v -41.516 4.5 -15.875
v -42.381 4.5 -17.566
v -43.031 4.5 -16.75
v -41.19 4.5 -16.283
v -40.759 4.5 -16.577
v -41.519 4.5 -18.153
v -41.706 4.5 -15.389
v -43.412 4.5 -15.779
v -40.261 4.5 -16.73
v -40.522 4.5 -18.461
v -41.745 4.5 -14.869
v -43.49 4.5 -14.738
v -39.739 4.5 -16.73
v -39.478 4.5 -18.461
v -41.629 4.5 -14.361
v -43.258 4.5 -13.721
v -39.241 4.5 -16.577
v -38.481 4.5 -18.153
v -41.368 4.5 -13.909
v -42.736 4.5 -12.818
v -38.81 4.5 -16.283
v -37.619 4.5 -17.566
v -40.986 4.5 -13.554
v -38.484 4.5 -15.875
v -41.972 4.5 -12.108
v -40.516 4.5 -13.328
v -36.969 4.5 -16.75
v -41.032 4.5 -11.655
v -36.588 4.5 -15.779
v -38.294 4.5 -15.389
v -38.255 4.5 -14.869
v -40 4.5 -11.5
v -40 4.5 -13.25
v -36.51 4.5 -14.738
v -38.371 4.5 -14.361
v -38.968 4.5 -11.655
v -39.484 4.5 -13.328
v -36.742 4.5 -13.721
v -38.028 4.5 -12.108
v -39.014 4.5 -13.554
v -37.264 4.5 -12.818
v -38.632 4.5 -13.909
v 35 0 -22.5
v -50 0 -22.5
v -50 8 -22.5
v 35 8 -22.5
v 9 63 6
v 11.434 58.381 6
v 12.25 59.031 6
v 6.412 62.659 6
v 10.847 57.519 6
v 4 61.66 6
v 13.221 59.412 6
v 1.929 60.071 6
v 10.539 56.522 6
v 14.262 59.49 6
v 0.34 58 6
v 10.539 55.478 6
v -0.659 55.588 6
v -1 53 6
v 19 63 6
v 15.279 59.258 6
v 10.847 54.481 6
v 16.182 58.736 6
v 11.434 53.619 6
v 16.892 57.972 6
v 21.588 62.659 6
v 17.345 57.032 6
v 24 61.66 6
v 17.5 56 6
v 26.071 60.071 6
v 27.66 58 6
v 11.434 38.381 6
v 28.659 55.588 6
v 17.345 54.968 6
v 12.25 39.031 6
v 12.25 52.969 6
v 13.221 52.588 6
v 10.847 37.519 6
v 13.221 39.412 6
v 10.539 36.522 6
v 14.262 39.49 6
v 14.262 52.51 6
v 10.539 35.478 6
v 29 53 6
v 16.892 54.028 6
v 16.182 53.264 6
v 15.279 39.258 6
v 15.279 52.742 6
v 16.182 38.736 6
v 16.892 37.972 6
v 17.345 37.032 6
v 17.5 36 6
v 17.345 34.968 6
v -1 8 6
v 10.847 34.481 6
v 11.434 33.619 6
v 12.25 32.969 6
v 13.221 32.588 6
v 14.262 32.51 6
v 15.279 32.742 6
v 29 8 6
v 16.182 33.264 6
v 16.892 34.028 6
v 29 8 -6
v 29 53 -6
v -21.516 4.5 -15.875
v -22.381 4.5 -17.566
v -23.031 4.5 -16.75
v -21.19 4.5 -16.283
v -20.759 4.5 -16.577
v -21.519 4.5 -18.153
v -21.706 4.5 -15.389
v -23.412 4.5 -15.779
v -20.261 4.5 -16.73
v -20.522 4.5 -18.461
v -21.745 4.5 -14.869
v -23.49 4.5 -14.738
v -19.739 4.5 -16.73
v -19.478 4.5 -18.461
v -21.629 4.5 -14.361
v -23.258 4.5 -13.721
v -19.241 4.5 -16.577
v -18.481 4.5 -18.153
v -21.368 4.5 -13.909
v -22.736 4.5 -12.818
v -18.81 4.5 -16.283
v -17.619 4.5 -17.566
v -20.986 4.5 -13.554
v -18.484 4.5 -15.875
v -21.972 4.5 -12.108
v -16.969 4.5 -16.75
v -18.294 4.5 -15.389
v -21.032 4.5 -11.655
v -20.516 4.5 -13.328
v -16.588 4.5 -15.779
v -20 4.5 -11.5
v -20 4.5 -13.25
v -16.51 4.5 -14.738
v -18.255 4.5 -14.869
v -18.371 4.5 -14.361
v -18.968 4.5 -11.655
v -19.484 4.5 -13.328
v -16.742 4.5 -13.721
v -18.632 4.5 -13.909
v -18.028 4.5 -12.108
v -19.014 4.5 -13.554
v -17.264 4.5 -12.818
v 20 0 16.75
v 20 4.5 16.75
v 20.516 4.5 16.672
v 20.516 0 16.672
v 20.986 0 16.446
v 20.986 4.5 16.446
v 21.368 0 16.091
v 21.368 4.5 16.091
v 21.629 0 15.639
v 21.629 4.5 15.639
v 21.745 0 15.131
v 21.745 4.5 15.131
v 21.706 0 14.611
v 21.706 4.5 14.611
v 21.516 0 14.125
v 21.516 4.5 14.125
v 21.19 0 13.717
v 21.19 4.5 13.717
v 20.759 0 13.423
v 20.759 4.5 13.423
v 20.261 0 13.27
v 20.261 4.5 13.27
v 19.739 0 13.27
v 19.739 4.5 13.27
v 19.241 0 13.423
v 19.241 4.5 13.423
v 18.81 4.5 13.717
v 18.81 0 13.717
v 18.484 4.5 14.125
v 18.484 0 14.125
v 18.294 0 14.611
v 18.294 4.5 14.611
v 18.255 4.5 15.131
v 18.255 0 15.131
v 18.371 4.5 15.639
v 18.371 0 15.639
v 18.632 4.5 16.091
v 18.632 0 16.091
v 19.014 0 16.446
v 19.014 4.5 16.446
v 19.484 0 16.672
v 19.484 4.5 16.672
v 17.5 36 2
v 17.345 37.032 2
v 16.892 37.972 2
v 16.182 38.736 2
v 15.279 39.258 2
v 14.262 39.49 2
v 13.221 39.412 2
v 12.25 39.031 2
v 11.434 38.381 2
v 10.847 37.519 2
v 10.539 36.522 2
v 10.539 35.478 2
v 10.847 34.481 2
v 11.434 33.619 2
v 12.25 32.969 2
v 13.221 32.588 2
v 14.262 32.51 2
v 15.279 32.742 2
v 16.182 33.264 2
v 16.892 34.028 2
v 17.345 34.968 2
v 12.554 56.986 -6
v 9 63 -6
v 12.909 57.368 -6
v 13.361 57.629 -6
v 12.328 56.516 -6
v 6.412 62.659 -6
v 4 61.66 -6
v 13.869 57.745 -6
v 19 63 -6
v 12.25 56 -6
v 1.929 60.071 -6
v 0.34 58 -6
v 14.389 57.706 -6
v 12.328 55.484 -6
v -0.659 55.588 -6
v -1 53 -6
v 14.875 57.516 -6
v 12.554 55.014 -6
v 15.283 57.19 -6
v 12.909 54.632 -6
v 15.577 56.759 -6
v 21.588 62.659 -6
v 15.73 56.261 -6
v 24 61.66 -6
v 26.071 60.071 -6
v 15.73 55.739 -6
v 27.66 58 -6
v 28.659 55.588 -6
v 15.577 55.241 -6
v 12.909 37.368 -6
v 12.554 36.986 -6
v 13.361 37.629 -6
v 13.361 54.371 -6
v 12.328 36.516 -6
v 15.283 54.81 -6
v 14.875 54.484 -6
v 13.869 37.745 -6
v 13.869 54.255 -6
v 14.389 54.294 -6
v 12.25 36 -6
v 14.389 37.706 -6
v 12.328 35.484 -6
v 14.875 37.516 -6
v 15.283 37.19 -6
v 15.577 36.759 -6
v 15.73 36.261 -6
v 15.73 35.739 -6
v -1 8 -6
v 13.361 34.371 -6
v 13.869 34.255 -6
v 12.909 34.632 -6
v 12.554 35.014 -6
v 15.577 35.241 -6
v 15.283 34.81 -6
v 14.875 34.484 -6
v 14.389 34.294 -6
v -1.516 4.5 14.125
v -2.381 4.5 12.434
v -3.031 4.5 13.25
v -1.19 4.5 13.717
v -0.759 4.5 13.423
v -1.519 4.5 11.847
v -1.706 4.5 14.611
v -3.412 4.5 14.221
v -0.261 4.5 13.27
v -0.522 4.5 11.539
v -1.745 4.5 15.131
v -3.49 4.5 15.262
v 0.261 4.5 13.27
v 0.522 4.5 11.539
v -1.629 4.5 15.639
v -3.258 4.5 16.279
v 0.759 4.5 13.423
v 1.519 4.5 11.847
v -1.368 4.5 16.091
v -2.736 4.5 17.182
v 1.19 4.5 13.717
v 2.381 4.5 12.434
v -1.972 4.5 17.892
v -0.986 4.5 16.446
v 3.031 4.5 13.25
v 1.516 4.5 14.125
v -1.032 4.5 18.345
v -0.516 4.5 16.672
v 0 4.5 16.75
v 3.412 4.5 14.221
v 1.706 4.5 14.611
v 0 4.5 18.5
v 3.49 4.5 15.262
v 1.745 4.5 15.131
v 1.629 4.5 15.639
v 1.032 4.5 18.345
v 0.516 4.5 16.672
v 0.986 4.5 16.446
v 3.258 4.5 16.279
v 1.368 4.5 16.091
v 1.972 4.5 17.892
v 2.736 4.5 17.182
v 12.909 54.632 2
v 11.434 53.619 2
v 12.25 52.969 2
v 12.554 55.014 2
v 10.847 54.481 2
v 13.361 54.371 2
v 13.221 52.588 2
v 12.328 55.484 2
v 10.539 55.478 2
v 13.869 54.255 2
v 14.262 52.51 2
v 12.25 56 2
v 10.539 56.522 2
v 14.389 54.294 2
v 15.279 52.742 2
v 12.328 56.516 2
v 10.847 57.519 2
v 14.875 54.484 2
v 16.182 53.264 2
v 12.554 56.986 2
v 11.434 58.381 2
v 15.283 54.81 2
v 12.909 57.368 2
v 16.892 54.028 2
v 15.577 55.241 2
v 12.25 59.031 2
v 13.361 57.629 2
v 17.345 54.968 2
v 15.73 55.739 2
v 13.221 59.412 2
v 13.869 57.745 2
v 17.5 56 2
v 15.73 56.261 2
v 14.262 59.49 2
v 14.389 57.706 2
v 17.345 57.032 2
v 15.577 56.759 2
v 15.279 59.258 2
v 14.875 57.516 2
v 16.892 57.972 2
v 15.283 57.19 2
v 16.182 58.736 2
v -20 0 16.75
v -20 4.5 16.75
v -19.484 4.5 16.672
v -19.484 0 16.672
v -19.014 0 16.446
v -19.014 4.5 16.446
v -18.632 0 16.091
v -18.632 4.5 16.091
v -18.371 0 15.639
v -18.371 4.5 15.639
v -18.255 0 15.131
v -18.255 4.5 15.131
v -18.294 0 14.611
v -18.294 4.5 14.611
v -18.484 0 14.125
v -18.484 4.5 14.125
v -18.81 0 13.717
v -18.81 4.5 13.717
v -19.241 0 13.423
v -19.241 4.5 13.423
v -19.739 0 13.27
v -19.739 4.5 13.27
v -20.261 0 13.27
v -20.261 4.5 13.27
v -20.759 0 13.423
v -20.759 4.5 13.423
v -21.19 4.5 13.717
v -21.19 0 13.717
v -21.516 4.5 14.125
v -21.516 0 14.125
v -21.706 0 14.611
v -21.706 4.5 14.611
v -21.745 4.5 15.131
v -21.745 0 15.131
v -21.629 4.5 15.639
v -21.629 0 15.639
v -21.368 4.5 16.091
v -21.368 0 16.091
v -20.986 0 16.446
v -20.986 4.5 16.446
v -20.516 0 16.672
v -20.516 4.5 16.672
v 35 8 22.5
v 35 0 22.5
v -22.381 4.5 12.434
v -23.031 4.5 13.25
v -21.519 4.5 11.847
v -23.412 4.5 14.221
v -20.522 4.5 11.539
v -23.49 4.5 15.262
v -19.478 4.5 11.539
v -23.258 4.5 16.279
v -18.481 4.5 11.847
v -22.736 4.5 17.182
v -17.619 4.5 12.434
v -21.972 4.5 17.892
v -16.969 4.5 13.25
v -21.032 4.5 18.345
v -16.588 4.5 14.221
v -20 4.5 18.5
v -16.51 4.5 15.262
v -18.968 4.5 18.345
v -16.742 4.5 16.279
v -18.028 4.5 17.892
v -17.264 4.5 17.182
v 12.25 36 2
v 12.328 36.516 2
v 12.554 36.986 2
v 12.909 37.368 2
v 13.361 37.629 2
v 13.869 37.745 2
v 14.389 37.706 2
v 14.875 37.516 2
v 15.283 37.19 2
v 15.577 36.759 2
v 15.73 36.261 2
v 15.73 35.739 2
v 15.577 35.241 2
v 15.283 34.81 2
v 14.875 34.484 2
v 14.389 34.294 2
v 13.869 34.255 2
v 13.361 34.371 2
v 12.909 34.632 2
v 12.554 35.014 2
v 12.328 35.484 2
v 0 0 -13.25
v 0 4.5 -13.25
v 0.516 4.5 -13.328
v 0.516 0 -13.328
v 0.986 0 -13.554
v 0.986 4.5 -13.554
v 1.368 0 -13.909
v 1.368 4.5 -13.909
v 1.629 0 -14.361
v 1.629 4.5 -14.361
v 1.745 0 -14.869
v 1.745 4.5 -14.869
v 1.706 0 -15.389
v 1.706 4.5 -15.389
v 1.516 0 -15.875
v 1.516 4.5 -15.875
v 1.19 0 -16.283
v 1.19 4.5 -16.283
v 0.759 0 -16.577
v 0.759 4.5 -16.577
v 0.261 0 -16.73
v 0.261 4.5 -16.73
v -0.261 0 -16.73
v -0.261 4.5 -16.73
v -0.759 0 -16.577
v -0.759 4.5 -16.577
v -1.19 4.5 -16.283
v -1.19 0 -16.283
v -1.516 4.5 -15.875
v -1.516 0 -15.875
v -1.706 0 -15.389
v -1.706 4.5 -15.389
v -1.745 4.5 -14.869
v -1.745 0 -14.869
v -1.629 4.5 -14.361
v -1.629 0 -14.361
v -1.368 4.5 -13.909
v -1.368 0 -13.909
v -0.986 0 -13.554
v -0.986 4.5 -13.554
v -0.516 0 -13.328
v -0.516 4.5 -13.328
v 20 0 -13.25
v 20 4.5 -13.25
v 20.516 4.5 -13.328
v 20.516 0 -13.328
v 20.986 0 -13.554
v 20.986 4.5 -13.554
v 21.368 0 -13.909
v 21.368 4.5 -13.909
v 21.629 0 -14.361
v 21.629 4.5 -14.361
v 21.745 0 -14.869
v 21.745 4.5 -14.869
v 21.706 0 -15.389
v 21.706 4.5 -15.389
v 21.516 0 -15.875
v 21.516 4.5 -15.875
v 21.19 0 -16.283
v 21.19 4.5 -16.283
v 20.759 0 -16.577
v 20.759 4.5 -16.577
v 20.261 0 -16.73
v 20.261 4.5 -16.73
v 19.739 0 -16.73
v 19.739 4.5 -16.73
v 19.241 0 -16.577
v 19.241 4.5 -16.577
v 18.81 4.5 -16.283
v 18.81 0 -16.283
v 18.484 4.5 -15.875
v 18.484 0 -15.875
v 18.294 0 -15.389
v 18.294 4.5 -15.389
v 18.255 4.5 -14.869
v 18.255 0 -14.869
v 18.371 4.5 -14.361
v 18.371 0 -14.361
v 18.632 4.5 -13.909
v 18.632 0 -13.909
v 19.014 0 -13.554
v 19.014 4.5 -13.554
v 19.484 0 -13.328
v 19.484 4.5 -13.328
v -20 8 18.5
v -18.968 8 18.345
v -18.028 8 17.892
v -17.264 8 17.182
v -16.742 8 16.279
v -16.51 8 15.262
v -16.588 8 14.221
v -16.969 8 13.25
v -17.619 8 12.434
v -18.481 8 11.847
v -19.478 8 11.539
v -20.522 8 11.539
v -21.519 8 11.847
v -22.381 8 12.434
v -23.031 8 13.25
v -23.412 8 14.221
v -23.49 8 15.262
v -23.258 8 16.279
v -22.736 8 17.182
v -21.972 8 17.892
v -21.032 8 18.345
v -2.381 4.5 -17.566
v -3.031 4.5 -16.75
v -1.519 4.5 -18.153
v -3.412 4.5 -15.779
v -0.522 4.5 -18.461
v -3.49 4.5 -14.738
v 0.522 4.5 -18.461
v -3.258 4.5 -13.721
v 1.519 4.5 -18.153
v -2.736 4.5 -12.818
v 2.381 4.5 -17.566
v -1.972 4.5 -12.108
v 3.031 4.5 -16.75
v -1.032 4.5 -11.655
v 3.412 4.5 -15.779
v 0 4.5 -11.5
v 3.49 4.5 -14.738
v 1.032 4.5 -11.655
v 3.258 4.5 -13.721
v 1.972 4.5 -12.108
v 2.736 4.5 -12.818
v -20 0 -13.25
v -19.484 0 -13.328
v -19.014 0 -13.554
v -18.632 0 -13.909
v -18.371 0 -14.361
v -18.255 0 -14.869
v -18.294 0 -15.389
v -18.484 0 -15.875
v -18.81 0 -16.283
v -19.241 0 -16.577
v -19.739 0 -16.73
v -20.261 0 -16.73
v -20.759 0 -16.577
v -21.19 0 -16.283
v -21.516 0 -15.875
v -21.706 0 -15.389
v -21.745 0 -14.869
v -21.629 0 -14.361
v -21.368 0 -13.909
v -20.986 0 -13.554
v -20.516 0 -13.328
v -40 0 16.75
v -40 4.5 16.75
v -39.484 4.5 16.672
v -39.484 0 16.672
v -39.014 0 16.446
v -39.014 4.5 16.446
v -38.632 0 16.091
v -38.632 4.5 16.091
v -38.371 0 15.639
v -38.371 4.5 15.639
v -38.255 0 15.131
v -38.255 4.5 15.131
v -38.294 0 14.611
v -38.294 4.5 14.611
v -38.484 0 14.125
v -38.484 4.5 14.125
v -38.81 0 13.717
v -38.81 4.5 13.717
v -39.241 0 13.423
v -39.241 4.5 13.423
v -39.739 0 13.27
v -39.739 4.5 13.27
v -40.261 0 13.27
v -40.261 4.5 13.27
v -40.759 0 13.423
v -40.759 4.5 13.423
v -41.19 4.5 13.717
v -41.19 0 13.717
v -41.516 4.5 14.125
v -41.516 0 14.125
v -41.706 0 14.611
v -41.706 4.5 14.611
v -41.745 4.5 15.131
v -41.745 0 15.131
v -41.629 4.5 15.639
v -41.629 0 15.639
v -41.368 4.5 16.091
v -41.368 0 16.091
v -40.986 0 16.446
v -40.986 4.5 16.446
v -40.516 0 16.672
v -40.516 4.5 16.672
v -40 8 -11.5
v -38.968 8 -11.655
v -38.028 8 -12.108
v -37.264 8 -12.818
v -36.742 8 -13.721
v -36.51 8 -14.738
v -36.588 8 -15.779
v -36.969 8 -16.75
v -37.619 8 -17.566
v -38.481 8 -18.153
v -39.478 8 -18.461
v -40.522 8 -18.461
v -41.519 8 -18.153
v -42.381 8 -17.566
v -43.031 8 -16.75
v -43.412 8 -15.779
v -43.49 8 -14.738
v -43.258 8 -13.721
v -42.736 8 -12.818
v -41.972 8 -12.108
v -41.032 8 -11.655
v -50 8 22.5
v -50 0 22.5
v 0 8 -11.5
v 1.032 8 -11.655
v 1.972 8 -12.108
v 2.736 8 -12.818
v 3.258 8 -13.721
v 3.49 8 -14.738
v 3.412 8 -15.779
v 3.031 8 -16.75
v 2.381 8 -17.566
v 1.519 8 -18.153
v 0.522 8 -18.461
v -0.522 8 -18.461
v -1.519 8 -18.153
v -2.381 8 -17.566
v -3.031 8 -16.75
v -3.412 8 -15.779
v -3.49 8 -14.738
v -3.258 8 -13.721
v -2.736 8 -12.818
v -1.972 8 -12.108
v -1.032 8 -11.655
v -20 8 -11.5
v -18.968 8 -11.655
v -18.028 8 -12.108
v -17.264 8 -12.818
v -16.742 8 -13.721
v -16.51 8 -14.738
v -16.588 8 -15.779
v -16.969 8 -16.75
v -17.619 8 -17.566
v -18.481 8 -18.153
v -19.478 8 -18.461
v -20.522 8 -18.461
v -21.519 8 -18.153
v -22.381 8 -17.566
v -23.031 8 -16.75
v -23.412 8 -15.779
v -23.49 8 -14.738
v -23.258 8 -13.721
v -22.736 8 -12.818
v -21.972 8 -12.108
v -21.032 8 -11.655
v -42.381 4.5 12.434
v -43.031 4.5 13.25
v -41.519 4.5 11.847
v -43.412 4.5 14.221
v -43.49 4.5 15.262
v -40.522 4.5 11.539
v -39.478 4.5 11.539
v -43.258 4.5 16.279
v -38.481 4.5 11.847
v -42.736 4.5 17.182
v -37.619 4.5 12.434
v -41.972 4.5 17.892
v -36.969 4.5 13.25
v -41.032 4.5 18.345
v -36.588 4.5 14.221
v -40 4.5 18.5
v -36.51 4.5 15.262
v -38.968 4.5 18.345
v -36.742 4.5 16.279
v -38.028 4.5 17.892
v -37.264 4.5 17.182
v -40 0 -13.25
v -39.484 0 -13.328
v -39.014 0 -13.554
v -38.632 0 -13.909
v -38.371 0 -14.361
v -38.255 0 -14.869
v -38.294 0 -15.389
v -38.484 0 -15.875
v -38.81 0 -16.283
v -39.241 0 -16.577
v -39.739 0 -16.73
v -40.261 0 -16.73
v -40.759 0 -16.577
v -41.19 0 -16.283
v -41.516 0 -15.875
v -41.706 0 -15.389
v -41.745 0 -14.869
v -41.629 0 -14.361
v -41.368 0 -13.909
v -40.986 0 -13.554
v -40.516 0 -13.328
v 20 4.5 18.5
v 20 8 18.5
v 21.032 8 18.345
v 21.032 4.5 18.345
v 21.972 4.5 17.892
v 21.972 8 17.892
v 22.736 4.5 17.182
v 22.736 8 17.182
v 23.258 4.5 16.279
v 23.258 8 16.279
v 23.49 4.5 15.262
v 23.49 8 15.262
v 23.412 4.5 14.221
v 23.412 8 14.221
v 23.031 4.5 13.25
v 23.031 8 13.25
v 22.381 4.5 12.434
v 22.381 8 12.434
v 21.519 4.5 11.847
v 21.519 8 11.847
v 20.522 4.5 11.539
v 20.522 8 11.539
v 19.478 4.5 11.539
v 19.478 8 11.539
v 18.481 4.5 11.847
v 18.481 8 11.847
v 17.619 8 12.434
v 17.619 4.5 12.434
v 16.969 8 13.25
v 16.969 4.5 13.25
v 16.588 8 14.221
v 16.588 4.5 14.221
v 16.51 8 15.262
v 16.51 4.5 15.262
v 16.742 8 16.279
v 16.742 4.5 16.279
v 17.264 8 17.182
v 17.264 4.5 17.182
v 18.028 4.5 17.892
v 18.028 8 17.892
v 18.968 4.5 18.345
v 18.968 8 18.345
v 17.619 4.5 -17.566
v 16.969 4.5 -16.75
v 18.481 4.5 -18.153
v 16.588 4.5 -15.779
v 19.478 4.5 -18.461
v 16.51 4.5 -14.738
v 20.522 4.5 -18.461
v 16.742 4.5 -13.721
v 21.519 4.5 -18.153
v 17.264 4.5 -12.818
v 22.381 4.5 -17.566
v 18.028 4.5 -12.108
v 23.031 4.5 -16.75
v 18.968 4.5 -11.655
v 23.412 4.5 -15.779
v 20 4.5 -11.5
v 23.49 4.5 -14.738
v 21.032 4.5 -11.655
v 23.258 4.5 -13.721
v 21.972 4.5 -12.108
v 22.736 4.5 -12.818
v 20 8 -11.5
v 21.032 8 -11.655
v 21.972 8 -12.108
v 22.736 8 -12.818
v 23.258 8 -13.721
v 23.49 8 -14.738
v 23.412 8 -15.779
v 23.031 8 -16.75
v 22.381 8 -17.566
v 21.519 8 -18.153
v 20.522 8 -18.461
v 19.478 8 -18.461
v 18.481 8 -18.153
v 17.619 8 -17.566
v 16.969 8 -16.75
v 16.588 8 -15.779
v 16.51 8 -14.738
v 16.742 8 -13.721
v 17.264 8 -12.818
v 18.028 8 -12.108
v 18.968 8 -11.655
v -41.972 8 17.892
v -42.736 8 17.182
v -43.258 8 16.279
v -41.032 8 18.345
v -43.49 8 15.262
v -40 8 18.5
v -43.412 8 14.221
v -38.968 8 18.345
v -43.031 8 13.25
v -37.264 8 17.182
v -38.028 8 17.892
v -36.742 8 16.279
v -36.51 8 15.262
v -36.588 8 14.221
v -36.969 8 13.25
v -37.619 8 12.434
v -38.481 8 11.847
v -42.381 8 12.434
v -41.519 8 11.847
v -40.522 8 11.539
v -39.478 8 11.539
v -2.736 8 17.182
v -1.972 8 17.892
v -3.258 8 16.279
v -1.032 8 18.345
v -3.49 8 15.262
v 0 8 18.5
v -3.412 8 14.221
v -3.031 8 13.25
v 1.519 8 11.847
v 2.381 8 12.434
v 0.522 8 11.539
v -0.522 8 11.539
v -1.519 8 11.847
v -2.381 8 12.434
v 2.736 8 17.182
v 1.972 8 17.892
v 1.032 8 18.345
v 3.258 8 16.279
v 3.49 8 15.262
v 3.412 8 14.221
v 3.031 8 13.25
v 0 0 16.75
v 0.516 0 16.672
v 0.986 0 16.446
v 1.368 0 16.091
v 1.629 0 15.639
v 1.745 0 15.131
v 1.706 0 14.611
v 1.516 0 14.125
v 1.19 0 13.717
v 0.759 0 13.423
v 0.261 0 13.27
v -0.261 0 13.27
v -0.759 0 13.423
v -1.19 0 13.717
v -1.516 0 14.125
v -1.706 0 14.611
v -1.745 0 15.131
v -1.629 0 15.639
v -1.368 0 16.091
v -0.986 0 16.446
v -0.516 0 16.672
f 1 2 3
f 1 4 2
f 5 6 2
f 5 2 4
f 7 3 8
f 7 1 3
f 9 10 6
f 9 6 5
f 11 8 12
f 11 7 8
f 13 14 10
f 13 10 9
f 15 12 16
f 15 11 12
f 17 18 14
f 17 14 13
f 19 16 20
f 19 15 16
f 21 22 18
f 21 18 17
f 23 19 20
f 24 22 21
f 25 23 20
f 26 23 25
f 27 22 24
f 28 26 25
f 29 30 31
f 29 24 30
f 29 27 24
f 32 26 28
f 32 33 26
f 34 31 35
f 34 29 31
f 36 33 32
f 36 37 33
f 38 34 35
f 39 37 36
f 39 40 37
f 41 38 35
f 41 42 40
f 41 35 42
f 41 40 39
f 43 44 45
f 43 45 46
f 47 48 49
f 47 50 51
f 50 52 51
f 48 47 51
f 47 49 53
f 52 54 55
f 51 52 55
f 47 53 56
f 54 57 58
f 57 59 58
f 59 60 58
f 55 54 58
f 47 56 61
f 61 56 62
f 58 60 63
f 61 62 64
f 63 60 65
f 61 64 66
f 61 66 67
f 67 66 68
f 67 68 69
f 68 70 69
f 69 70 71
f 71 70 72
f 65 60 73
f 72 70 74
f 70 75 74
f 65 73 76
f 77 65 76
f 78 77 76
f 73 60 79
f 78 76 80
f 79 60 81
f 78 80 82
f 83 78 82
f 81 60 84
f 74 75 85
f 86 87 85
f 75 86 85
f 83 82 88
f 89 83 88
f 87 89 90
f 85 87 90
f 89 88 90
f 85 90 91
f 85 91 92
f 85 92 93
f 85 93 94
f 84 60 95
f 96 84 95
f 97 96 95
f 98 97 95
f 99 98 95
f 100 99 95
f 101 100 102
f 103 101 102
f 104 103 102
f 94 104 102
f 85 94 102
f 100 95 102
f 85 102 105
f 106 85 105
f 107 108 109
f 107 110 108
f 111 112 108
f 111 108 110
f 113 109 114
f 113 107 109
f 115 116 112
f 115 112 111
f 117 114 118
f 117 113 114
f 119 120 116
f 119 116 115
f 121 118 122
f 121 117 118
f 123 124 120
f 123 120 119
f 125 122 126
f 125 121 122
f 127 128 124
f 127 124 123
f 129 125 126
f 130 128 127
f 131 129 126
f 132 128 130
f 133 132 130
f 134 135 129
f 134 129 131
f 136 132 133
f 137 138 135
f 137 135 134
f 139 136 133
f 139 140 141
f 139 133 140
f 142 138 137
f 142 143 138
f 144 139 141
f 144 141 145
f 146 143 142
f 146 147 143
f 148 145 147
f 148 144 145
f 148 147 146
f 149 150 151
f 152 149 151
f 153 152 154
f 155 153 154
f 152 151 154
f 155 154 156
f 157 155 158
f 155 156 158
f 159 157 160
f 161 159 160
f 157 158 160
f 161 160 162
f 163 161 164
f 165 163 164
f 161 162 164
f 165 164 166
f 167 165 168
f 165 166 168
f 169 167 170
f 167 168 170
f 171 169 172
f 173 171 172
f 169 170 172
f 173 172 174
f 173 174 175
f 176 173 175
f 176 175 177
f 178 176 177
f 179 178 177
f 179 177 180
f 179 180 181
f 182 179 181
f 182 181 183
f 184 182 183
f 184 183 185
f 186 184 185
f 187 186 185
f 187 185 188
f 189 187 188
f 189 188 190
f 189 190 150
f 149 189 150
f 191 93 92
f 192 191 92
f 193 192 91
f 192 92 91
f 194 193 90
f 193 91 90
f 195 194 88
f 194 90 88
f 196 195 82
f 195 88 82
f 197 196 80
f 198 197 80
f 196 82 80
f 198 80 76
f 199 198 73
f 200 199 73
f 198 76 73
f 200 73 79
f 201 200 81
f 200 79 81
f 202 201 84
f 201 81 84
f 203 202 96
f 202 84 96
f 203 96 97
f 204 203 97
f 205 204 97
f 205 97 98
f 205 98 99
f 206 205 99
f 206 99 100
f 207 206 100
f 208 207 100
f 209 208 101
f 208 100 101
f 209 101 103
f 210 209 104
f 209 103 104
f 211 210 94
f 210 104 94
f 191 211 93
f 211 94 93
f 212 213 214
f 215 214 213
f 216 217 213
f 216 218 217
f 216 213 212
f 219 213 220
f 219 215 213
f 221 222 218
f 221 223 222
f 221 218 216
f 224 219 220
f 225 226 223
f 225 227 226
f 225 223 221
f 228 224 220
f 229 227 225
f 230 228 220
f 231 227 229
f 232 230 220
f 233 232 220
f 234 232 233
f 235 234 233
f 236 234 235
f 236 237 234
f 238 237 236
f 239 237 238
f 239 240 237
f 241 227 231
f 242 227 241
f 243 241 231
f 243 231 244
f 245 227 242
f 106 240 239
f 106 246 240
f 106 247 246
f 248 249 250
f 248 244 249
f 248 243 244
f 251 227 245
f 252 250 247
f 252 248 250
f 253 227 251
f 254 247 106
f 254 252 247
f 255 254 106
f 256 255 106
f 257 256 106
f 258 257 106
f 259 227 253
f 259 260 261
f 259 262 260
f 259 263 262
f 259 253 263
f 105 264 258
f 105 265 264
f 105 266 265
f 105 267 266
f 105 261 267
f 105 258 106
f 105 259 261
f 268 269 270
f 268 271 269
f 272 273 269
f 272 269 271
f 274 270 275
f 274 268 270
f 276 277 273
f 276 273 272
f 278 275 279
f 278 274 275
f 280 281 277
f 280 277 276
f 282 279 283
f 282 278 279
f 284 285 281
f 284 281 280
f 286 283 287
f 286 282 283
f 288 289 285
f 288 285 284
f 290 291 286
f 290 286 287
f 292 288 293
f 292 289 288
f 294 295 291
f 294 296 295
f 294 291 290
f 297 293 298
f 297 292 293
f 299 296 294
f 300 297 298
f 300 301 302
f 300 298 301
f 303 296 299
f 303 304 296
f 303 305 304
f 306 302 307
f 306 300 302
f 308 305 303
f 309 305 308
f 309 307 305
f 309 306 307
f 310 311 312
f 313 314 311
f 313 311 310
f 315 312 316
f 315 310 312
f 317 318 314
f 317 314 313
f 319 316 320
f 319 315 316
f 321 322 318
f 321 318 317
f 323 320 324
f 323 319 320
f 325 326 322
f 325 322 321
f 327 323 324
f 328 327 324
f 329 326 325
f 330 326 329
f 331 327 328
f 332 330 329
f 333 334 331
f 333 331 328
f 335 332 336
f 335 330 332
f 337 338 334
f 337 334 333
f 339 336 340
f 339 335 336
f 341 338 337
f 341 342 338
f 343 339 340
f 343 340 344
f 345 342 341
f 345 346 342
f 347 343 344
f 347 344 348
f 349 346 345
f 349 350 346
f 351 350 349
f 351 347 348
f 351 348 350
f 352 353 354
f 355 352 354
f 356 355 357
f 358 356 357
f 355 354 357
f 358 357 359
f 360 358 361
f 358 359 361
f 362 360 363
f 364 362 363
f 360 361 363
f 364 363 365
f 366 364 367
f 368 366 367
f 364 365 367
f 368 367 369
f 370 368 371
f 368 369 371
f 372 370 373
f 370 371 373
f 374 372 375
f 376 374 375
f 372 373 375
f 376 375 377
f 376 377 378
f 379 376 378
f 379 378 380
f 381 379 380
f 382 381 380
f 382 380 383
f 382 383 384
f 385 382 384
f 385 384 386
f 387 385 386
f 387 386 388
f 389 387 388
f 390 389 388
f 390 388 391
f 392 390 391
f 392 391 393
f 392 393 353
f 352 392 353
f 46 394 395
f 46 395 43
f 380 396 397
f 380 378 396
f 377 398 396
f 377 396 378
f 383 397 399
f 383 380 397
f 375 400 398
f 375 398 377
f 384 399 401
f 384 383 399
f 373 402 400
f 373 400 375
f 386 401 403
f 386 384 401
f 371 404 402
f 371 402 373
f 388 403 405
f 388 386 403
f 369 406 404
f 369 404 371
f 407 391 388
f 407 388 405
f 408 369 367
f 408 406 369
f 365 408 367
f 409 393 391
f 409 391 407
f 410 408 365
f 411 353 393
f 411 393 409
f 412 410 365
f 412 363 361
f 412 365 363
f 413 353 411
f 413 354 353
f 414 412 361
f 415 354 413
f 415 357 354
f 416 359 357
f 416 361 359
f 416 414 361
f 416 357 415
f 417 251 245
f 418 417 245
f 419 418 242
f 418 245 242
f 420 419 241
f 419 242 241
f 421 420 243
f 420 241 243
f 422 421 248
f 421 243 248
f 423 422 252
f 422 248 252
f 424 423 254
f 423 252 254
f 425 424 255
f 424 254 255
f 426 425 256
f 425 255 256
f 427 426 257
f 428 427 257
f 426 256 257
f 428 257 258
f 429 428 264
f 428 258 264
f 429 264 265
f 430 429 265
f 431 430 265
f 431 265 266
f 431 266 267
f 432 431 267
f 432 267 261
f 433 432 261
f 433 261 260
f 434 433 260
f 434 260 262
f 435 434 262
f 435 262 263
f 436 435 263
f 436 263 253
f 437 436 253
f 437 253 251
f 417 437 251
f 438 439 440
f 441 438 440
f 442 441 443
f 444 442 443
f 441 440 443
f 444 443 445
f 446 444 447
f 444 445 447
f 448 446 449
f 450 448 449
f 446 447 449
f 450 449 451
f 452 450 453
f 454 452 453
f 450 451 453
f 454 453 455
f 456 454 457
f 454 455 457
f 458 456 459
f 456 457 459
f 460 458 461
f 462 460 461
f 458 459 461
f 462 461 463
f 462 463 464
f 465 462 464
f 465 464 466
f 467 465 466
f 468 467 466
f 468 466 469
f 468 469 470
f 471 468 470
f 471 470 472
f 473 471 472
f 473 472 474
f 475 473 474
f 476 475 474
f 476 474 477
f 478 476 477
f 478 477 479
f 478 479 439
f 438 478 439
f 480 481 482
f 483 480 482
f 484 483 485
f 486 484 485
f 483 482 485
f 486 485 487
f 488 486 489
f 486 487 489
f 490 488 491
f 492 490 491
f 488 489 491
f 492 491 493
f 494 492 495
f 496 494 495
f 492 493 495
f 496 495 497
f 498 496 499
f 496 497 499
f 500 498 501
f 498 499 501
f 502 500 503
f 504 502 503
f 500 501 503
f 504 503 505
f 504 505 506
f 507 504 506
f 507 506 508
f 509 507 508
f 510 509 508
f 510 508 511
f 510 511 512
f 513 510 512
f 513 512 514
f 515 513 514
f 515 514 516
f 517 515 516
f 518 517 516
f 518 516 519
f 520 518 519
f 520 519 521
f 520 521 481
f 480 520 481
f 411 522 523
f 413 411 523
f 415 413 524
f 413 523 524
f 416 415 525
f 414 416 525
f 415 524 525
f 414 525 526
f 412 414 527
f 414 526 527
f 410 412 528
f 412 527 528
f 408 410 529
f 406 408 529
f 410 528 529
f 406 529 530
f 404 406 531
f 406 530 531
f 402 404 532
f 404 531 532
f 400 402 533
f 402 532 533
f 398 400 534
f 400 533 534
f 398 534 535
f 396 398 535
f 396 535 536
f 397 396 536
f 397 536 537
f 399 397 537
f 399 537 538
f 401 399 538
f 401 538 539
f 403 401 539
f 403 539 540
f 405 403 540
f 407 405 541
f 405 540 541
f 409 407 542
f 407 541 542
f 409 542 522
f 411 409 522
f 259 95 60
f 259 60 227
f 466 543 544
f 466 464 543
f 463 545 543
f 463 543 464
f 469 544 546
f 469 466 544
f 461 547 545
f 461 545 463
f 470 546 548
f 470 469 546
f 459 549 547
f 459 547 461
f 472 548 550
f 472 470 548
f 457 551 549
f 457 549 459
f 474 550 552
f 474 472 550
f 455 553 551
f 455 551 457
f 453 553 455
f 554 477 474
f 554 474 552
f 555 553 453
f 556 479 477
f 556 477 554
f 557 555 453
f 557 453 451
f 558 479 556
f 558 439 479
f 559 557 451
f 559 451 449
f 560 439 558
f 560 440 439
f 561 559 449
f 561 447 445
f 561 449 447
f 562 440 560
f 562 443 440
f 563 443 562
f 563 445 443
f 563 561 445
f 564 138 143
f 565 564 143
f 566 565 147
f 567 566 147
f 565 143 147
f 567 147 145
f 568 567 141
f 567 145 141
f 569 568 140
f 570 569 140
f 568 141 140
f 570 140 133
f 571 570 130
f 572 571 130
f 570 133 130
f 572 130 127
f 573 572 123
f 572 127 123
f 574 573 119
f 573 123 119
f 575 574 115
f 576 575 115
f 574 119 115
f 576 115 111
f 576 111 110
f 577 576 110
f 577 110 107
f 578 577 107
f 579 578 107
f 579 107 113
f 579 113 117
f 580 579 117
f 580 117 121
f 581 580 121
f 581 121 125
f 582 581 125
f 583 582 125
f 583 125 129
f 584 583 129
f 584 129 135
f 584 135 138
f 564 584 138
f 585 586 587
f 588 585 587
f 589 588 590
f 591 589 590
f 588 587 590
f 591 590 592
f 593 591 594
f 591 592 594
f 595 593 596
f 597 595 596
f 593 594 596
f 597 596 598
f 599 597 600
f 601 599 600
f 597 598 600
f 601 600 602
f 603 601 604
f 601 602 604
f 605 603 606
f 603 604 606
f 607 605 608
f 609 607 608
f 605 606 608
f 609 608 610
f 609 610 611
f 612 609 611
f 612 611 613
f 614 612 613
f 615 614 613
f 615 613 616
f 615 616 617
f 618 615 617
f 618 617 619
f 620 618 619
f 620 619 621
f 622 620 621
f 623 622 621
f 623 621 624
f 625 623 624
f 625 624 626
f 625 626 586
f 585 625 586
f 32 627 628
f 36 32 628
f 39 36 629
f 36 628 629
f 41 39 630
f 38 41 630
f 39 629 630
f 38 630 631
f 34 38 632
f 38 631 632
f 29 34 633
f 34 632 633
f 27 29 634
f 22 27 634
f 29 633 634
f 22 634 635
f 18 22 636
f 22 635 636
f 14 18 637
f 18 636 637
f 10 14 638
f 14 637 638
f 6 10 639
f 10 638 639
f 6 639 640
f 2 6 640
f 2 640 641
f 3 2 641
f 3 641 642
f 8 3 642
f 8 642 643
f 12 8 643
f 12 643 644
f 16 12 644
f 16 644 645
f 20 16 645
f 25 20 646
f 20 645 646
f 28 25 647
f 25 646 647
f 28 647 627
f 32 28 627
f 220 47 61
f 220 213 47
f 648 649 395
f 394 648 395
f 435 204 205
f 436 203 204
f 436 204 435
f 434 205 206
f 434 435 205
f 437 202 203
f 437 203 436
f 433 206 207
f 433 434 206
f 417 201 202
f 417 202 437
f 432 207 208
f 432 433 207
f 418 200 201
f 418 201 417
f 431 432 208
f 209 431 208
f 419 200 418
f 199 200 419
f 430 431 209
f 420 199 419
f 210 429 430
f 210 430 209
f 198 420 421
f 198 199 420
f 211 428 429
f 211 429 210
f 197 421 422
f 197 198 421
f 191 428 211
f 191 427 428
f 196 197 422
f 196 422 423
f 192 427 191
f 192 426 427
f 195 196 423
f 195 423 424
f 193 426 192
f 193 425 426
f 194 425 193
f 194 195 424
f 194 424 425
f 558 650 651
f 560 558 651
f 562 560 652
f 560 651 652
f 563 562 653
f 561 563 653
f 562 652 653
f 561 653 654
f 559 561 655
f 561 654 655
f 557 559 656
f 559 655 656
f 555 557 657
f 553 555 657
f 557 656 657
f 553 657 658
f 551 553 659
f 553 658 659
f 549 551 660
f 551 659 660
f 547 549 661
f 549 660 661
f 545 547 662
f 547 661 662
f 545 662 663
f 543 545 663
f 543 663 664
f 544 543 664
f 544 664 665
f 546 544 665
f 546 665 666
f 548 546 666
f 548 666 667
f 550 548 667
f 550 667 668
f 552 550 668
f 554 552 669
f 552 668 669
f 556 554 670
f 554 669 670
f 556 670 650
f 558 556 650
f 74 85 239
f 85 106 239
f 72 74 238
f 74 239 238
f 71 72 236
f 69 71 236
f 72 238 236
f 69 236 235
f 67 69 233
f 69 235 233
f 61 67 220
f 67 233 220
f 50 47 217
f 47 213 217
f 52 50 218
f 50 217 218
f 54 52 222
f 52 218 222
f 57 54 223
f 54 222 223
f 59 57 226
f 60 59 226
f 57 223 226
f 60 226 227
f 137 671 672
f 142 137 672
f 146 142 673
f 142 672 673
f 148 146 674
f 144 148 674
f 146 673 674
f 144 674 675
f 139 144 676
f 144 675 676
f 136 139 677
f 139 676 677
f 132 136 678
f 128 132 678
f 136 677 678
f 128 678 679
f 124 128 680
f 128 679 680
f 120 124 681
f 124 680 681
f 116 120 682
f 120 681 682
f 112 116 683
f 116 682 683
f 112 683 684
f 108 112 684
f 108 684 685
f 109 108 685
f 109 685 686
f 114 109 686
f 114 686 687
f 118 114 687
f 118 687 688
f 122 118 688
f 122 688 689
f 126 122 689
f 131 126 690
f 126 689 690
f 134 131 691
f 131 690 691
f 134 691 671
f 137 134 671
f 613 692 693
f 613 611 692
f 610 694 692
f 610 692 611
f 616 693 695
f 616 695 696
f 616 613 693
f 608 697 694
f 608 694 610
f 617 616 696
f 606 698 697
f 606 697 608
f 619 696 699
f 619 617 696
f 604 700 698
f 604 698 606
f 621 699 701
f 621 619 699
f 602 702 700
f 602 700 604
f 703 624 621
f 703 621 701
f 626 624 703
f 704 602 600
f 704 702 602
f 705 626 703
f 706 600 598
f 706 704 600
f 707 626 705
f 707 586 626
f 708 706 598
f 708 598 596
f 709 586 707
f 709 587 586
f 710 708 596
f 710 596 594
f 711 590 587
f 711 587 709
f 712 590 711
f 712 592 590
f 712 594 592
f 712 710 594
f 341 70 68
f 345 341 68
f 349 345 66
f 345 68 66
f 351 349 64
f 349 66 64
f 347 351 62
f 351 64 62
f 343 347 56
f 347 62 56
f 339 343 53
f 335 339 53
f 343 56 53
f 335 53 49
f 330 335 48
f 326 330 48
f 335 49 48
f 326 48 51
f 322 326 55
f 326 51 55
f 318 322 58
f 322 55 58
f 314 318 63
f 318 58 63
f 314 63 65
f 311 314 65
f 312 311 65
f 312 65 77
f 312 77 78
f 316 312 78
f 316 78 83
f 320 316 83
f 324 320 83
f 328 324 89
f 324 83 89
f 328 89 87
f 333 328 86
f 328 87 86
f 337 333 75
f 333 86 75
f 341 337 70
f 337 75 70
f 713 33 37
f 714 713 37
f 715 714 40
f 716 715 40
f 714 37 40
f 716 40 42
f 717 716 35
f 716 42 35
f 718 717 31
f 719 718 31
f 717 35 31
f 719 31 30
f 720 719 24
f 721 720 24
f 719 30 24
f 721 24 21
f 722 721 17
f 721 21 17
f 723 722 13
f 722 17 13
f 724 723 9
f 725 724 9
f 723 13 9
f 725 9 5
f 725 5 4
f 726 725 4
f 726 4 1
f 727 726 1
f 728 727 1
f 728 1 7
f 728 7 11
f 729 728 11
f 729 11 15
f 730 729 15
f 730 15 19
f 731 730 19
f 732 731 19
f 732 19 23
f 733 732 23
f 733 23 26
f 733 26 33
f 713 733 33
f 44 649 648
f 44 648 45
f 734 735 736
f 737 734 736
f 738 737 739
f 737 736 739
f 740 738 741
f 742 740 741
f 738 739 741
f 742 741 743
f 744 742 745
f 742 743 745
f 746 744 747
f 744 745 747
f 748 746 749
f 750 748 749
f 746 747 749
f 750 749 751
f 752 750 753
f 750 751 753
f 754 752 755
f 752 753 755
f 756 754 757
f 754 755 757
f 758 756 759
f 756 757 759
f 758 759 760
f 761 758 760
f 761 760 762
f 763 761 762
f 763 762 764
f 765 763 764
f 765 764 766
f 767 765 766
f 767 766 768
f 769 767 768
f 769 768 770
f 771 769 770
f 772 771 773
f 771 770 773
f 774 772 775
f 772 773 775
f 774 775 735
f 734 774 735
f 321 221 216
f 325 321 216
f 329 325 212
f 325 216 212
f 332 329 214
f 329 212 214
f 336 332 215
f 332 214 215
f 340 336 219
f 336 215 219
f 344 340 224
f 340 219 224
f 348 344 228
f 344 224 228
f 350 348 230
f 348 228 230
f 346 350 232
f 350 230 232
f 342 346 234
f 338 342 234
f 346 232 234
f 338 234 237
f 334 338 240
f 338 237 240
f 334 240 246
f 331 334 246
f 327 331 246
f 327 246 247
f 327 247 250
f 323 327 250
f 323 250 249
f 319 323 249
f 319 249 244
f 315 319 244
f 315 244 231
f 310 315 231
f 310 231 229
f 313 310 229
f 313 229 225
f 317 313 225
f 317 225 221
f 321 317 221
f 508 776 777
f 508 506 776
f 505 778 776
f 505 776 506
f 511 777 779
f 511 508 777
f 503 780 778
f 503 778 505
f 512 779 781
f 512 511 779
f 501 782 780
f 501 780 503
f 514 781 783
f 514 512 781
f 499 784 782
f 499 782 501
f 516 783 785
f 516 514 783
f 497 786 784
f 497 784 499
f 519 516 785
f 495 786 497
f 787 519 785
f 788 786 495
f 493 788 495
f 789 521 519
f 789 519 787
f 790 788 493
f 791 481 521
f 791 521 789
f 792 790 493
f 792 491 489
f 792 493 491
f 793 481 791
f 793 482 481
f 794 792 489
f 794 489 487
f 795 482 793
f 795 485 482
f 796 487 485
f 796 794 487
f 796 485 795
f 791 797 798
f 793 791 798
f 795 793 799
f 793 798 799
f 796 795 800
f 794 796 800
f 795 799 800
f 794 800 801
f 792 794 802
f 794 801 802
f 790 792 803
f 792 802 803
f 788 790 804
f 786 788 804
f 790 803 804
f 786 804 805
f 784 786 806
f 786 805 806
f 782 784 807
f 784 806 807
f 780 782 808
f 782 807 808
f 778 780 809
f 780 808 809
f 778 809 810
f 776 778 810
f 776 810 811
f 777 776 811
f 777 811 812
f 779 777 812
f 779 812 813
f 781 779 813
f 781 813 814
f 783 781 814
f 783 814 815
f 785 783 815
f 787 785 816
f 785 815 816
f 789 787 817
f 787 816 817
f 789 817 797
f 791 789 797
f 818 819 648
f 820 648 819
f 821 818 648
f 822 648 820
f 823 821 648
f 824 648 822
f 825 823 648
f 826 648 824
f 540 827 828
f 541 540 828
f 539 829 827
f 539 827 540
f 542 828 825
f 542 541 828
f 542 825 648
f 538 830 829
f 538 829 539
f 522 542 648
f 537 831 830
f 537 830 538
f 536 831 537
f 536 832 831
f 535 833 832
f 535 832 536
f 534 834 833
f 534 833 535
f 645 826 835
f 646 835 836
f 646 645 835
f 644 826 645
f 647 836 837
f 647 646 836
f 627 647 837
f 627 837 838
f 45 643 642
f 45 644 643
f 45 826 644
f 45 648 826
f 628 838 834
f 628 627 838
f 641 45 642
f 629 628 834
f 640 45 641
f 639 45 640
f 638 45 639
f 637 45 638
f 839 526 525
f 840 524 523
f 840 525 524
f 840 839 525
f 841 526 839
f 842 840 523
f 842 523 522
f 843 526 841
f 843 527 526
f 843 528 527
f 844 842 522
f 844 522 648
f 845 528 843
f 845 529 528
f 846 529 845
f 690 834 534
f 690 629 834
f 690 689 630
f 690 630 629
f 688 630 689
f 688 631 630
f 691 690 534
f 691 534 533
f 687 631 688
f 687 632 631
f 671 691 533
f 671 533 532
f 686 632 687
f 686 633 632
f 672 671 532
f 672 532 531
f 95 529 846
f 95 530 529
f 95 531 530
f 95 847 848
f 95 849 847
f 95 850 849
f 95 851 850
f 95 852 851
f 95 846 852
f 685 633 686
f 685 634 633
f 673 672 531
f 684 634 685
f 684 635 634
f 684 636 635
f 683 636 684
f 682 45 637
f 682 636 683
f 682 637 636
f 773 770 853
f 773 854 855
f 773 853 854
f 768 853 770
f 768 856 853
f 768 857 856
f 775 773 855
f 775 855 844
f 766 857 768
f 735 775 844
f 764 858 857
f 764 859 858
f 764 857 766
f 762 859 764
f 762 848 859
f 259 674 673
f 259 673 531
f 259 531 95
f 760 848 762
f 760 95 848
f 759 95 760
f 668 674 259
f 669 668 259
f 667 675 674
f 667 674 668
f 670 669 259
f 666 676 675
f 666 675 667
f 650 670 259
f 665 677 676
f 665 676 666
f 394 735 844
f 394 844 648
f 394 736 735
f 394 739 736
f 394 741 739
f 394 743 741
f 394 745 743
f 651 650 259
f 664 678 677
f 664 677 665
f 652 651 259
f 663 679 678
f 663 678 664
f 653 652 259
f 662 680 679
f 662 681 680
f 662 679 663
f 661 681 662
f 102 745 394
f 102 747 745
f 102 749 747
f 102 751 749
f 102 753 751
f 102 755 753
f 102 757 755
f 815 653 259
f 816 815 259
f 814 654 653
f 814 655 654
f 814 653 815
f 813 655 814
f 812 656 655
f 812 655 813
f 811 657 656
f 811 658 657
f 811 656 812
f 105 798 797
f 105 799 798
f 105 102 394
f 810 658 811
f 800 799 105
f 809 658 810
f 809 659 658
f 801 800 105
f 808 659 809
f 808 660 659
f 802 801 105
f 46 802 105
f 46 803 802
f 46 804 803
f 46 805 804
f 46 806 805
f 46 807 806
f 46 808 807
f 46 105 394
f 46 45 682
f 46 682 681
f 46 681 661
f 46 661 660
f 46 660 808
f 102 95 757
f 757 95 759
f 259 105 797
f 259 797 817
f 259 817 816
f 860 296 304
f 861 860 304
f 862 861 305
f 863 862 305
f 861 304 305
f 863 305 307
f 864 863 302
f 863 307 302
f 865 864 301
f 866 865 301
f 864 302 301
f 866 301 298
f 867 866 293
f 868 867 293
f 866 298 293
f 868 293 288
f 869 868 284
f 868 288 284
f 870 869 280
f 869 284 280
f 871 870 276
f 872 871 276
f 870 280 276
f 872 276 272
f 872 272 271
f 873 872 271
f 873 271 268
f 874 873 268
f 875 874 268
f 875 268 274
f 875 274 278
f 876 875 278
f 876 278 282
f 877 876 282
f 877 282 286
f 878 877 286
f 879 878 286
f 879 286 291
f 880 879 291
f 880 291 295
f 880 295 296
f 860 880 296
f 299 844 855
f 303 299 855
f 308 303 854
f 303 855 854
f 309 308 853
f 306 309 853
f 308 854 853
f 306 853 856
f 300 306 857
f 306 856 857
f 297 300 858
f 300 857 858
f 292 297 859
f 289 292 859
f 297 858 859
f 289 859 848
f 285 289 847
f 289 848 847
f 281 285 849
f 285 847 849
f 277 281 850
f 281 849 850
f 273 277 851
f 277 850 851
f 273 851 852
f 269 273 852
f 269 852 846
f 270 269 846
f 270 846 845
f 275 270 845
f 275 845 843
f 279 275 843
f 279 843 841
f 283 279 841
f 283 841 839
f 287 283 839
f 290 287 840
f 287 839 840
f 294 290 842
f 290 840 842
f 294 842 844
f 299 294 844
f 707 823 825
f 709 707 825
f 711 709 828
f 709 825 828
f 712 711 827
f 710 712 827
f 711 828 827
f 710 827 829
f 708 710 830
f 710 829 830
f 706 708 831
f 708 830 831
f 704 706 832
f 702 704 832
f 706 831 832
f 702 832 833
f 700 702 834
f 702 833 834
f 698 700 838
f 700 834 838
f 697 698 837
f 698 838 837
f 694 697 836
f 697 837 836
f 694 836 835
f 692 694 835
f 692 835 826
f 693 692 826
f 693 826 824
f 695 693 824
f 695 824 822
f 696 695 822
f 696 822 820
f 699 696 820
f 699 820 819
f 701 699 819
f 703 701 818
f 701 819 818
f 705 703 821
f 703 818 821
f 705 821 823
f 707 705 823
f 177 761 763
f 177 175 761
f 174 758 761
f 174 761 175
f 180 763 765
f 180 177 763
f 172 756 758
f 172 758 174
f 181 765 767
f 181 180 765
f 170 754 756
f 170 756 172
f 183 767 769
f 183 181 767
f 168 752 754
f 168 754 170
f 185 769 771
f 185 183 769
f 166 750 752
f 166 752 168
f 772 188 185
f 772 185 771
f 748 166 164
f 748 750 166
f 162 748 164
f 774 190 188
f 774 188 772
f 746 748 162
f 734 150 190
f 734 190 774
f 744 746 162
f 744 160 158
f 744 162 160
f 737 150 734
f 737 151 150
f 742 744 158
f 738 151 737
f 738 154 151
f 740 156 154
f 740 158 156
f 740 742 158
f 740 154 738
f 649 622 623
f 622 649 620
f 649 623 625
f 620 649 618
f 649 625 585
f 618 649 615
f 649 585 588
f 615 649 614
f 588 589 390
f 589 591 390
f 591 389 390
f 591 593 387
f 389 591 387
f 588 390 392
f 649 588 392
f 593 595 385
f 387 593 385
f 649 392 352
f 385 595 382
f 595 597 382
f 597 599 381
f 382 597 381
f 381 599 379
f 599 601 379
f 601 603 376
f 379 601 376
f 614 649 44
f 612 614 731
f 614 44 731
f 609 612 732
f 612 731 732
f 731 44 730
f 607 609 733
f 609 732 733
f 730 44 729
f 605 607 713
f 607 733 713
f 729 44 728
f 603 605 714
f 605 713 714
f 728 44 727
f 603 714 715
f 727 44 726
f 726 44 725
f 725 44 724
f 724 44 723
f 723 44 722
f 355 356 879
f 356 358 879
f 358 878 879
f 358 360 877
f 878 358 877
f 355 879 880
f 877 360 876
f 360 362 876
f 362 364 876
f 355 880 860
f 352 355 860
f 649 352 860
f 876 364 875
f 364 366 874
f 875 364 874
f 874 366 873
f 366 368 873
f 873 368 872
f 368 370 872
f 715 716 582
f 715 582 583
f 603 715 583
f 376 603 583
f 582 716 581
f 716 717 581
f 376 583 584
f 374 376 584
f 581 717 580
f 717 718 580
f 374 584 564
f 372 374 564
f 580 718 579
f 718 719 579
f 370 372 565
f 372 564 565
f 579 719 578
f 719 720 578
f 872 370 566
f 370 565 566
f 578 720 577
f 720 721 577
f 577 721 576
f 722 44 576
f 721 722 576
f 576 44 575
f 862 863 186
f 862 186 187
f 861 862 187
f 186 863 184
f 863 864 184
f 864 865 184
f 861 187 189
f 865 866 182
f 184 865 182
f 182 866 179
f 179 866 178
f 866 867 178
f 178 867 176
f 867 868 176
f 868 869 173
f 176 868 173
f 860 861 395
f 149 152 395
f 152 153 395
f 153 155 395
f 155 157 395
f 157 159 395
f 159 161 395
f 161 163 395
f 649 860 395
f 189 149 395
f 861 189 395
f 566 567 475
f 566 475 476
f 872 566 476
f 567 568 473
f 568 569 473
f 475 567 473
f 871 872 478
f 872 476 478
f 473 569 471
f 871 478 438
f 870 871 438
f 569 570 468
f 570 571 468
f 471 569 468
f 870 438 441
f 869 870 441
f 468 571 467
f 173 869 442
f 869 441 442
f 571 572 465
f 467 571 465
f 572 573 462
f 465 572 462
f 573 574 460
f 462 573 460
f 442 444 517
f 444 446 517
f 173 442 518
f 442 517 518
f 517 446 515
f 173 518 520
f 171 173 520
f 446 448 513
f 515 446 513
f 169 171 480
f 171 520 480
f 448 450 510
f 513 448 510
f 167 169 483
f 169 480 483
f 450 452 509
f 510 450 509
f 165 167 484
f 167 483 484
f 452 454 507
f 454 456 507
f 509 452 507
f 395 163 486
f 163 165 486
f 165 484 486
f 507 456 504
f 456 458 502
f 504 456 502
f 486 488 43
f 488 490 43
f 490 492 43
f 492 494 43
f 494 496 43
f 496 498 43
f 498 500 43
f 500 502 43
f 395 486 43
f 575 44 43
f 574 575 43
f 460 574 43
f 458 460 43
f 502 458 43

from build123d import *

# Parameters (mm, degrees)
SKETCH1_W           = 100
SKETCH1_H           = 45
BOSS_EXTRUDE1_DEPTH = 8
SKETCH2_R           = 1.75
CUT_EXTRUDE1_DEPTH  = 8
SKETCH3_R           = 3.5
CUT_EXTRUDE2_DEPTH  = 3.5
SKETCH4_W           = 30
SKETCH4_H           = 12
BOSS_EXTRUDE2_DEPTH = 55
SKETCH7_W           = 15
SKETCH7_H           = 45
CUT_EXTRUDE4_DEPTH  = 8
SKETCH9_R           = 1.75
CUT_EXTRUDE6_DEPTH  = 12
FILLET1_R           = 10
FILLET2_R           = 10
SKETCH10_R          = 3.5
CUT_EXTRUDE7_DEPTH  = 4


with BuildPart() as part:
    # Sketch1 → Boss-Extrude1 (new body)
    with BuildSketch(Plane(origin=(0, 0, 0), x_dir=(1, 0, 0), z_dir=(0, 1, 0))):
        Rectangle(SKETCH1_W, SKETCH1_H)
    extrude(amount=BOSS_EXTRUDE1_DEPTH)

    # Sketch2 → Cut-Extrude1 (cut)
    with BuildSketch(Plane(origin=(0, 8, 0), x_dir=(1, 0, 0), z_dir=(0, 1, 0))):
        with Locations(Location((20, 15, 0), (0, 0, 270))):
            Circle(SKETCH2_R)
        with Locations(Location((20, -15, 0), (0, 0, 270))):
            Circle(SKETCH2_R)
        with Locations(Location((0, 15, 0), (0, 0, 270))):
            Circle(SKETCH2_R)
        with Locations(Location((0, -15, 0), (0, 0, 270))):
            Circle(SKETCH2_R)
        with Locations(Location((-20, 15, 0), (0, 0, 270))):
            Circle(SKETCH2_R)
        with Locations(Location((-20, -15, 0), (0, 0, 270))):
            Circle(SKETCH2_R)
        with Locations(Location((-40, 15, 0), (0, 0, 270))):
            Circle(SKETCH2_R)
        with Locations(Location((-40, -15, 0), (0, 0, 270))):
            Circle(SKETCH2_R)
    extrude(amount=-CUT_EXTRUDE1_DEPTH, mode=Mode.SUBTRACT)

    # Sketch3 → Cut-Extrude2 (cut)
    with BuildSketch(Plane(origin=(0, 8, 0), x_dir=(1, 0, 0), z_dir=(0, 1, 0))):
        with Locations(Location((-40, 15, 0), (0, 0, 270))):
            Circle(SKETCH3_R)
        with Locations(Location((-20, 15, 0), (0, 0, 270))):
            Circle(SKETCH3_R)
        with Locations(Location((0, 15, 0), (0, 0, 270))):
            Circle(SKETCH3_R)
        with Locations(Location((20, 15, 0), (0, 0, 270))):
            Circle(SKETCH3_R)
        with Locations(Location((-40, -15, 0), (0, 0, 270))):
            Circle(SKETCH3_R)
        with Locations(Location((-20, -15, 0), (0, 0, 270))):
            Circle(SKETCH3_R)
        with Locations(Location((0, -15, 0), (0, 0, 270))):
            Circle(SKETCH3_R)
        with Locations(Location((20, -15, 0), (0, 0, 270))):
            Circle(SKETCH3_R)
    extrude(amount=-CUT_EXTRUDE2_DEPTH, mode=Mode.SUBTRACT)

    # Sketch4 → Boss-Extrude2 (add)
    with BuildSketch(Plane(origin=(0, 8, 0), x_dir=(1, 0, 0), z_dir=(0, 1, 0))):
        with Locations((14, 0)):
            Rectangle(SKETCH4_W, SKETCH4_H)
    extrude(amount=BOSS_EXTRUDE2_DEPTH)

    # Sketch7 → Cut-Extrude4 (cut)
    with BuildSketch(Plane(origin=(0, 8, 0), x_dir=(1, 0, 0), z_dir=(0, 1, 0))):
        with Locations((42.5, 0)):
            Rectangle(SKETCH7_W, SKETCH7_H)
    extrude(amount=-CUT_EXTRUDE4_DEPTH, mode=Mode.SUBTRACT)

    # Sketch9 → Cut-Extrude6 (cut)
    with BuildSketch(Plane(origin=(0, 0, -6), x_dir=(-1, 0, 0), z_dir=(0, 0, -1))):
        with Locations((-14, 56)):
            Circle(SKETCH9_R)
        with Locations((-14, 36)):
            Circle(SKETCH9_R)
    extrude(amount=-CUT_EXTRUDE6_DEPTH, mode=Mode.SUBTRACT)

    # Fillet1
    fillet1_edges = [part.edges().sort_by_distance(p)[0] for p in [
        (29, 63, 0),
    ]]
    fillet(fillet1_edges, radius=FILLET1_R)

    # Fillet2
    fillet2_edges = [part.edges().sort_by_distance(p)[0] for p in [
        (-1, 63, 0),
    ]]
    fillet(fillet2_edges, radius=FILLET2_R)

    # Sketch10 → Cut-Extrude7 (cut)
    with BuildSketch(Plane.XY.offset(6)):
        with Locations((14, 36)):
            Circle(SKETCH10_R)
        with Locations((14, 56)):
            Circle(SKETCH10_R)
    extrude(amount=-CUT_EXTRUDE7_DEPTH, mode=Mode.SUBTRACT)


solid = part.part
